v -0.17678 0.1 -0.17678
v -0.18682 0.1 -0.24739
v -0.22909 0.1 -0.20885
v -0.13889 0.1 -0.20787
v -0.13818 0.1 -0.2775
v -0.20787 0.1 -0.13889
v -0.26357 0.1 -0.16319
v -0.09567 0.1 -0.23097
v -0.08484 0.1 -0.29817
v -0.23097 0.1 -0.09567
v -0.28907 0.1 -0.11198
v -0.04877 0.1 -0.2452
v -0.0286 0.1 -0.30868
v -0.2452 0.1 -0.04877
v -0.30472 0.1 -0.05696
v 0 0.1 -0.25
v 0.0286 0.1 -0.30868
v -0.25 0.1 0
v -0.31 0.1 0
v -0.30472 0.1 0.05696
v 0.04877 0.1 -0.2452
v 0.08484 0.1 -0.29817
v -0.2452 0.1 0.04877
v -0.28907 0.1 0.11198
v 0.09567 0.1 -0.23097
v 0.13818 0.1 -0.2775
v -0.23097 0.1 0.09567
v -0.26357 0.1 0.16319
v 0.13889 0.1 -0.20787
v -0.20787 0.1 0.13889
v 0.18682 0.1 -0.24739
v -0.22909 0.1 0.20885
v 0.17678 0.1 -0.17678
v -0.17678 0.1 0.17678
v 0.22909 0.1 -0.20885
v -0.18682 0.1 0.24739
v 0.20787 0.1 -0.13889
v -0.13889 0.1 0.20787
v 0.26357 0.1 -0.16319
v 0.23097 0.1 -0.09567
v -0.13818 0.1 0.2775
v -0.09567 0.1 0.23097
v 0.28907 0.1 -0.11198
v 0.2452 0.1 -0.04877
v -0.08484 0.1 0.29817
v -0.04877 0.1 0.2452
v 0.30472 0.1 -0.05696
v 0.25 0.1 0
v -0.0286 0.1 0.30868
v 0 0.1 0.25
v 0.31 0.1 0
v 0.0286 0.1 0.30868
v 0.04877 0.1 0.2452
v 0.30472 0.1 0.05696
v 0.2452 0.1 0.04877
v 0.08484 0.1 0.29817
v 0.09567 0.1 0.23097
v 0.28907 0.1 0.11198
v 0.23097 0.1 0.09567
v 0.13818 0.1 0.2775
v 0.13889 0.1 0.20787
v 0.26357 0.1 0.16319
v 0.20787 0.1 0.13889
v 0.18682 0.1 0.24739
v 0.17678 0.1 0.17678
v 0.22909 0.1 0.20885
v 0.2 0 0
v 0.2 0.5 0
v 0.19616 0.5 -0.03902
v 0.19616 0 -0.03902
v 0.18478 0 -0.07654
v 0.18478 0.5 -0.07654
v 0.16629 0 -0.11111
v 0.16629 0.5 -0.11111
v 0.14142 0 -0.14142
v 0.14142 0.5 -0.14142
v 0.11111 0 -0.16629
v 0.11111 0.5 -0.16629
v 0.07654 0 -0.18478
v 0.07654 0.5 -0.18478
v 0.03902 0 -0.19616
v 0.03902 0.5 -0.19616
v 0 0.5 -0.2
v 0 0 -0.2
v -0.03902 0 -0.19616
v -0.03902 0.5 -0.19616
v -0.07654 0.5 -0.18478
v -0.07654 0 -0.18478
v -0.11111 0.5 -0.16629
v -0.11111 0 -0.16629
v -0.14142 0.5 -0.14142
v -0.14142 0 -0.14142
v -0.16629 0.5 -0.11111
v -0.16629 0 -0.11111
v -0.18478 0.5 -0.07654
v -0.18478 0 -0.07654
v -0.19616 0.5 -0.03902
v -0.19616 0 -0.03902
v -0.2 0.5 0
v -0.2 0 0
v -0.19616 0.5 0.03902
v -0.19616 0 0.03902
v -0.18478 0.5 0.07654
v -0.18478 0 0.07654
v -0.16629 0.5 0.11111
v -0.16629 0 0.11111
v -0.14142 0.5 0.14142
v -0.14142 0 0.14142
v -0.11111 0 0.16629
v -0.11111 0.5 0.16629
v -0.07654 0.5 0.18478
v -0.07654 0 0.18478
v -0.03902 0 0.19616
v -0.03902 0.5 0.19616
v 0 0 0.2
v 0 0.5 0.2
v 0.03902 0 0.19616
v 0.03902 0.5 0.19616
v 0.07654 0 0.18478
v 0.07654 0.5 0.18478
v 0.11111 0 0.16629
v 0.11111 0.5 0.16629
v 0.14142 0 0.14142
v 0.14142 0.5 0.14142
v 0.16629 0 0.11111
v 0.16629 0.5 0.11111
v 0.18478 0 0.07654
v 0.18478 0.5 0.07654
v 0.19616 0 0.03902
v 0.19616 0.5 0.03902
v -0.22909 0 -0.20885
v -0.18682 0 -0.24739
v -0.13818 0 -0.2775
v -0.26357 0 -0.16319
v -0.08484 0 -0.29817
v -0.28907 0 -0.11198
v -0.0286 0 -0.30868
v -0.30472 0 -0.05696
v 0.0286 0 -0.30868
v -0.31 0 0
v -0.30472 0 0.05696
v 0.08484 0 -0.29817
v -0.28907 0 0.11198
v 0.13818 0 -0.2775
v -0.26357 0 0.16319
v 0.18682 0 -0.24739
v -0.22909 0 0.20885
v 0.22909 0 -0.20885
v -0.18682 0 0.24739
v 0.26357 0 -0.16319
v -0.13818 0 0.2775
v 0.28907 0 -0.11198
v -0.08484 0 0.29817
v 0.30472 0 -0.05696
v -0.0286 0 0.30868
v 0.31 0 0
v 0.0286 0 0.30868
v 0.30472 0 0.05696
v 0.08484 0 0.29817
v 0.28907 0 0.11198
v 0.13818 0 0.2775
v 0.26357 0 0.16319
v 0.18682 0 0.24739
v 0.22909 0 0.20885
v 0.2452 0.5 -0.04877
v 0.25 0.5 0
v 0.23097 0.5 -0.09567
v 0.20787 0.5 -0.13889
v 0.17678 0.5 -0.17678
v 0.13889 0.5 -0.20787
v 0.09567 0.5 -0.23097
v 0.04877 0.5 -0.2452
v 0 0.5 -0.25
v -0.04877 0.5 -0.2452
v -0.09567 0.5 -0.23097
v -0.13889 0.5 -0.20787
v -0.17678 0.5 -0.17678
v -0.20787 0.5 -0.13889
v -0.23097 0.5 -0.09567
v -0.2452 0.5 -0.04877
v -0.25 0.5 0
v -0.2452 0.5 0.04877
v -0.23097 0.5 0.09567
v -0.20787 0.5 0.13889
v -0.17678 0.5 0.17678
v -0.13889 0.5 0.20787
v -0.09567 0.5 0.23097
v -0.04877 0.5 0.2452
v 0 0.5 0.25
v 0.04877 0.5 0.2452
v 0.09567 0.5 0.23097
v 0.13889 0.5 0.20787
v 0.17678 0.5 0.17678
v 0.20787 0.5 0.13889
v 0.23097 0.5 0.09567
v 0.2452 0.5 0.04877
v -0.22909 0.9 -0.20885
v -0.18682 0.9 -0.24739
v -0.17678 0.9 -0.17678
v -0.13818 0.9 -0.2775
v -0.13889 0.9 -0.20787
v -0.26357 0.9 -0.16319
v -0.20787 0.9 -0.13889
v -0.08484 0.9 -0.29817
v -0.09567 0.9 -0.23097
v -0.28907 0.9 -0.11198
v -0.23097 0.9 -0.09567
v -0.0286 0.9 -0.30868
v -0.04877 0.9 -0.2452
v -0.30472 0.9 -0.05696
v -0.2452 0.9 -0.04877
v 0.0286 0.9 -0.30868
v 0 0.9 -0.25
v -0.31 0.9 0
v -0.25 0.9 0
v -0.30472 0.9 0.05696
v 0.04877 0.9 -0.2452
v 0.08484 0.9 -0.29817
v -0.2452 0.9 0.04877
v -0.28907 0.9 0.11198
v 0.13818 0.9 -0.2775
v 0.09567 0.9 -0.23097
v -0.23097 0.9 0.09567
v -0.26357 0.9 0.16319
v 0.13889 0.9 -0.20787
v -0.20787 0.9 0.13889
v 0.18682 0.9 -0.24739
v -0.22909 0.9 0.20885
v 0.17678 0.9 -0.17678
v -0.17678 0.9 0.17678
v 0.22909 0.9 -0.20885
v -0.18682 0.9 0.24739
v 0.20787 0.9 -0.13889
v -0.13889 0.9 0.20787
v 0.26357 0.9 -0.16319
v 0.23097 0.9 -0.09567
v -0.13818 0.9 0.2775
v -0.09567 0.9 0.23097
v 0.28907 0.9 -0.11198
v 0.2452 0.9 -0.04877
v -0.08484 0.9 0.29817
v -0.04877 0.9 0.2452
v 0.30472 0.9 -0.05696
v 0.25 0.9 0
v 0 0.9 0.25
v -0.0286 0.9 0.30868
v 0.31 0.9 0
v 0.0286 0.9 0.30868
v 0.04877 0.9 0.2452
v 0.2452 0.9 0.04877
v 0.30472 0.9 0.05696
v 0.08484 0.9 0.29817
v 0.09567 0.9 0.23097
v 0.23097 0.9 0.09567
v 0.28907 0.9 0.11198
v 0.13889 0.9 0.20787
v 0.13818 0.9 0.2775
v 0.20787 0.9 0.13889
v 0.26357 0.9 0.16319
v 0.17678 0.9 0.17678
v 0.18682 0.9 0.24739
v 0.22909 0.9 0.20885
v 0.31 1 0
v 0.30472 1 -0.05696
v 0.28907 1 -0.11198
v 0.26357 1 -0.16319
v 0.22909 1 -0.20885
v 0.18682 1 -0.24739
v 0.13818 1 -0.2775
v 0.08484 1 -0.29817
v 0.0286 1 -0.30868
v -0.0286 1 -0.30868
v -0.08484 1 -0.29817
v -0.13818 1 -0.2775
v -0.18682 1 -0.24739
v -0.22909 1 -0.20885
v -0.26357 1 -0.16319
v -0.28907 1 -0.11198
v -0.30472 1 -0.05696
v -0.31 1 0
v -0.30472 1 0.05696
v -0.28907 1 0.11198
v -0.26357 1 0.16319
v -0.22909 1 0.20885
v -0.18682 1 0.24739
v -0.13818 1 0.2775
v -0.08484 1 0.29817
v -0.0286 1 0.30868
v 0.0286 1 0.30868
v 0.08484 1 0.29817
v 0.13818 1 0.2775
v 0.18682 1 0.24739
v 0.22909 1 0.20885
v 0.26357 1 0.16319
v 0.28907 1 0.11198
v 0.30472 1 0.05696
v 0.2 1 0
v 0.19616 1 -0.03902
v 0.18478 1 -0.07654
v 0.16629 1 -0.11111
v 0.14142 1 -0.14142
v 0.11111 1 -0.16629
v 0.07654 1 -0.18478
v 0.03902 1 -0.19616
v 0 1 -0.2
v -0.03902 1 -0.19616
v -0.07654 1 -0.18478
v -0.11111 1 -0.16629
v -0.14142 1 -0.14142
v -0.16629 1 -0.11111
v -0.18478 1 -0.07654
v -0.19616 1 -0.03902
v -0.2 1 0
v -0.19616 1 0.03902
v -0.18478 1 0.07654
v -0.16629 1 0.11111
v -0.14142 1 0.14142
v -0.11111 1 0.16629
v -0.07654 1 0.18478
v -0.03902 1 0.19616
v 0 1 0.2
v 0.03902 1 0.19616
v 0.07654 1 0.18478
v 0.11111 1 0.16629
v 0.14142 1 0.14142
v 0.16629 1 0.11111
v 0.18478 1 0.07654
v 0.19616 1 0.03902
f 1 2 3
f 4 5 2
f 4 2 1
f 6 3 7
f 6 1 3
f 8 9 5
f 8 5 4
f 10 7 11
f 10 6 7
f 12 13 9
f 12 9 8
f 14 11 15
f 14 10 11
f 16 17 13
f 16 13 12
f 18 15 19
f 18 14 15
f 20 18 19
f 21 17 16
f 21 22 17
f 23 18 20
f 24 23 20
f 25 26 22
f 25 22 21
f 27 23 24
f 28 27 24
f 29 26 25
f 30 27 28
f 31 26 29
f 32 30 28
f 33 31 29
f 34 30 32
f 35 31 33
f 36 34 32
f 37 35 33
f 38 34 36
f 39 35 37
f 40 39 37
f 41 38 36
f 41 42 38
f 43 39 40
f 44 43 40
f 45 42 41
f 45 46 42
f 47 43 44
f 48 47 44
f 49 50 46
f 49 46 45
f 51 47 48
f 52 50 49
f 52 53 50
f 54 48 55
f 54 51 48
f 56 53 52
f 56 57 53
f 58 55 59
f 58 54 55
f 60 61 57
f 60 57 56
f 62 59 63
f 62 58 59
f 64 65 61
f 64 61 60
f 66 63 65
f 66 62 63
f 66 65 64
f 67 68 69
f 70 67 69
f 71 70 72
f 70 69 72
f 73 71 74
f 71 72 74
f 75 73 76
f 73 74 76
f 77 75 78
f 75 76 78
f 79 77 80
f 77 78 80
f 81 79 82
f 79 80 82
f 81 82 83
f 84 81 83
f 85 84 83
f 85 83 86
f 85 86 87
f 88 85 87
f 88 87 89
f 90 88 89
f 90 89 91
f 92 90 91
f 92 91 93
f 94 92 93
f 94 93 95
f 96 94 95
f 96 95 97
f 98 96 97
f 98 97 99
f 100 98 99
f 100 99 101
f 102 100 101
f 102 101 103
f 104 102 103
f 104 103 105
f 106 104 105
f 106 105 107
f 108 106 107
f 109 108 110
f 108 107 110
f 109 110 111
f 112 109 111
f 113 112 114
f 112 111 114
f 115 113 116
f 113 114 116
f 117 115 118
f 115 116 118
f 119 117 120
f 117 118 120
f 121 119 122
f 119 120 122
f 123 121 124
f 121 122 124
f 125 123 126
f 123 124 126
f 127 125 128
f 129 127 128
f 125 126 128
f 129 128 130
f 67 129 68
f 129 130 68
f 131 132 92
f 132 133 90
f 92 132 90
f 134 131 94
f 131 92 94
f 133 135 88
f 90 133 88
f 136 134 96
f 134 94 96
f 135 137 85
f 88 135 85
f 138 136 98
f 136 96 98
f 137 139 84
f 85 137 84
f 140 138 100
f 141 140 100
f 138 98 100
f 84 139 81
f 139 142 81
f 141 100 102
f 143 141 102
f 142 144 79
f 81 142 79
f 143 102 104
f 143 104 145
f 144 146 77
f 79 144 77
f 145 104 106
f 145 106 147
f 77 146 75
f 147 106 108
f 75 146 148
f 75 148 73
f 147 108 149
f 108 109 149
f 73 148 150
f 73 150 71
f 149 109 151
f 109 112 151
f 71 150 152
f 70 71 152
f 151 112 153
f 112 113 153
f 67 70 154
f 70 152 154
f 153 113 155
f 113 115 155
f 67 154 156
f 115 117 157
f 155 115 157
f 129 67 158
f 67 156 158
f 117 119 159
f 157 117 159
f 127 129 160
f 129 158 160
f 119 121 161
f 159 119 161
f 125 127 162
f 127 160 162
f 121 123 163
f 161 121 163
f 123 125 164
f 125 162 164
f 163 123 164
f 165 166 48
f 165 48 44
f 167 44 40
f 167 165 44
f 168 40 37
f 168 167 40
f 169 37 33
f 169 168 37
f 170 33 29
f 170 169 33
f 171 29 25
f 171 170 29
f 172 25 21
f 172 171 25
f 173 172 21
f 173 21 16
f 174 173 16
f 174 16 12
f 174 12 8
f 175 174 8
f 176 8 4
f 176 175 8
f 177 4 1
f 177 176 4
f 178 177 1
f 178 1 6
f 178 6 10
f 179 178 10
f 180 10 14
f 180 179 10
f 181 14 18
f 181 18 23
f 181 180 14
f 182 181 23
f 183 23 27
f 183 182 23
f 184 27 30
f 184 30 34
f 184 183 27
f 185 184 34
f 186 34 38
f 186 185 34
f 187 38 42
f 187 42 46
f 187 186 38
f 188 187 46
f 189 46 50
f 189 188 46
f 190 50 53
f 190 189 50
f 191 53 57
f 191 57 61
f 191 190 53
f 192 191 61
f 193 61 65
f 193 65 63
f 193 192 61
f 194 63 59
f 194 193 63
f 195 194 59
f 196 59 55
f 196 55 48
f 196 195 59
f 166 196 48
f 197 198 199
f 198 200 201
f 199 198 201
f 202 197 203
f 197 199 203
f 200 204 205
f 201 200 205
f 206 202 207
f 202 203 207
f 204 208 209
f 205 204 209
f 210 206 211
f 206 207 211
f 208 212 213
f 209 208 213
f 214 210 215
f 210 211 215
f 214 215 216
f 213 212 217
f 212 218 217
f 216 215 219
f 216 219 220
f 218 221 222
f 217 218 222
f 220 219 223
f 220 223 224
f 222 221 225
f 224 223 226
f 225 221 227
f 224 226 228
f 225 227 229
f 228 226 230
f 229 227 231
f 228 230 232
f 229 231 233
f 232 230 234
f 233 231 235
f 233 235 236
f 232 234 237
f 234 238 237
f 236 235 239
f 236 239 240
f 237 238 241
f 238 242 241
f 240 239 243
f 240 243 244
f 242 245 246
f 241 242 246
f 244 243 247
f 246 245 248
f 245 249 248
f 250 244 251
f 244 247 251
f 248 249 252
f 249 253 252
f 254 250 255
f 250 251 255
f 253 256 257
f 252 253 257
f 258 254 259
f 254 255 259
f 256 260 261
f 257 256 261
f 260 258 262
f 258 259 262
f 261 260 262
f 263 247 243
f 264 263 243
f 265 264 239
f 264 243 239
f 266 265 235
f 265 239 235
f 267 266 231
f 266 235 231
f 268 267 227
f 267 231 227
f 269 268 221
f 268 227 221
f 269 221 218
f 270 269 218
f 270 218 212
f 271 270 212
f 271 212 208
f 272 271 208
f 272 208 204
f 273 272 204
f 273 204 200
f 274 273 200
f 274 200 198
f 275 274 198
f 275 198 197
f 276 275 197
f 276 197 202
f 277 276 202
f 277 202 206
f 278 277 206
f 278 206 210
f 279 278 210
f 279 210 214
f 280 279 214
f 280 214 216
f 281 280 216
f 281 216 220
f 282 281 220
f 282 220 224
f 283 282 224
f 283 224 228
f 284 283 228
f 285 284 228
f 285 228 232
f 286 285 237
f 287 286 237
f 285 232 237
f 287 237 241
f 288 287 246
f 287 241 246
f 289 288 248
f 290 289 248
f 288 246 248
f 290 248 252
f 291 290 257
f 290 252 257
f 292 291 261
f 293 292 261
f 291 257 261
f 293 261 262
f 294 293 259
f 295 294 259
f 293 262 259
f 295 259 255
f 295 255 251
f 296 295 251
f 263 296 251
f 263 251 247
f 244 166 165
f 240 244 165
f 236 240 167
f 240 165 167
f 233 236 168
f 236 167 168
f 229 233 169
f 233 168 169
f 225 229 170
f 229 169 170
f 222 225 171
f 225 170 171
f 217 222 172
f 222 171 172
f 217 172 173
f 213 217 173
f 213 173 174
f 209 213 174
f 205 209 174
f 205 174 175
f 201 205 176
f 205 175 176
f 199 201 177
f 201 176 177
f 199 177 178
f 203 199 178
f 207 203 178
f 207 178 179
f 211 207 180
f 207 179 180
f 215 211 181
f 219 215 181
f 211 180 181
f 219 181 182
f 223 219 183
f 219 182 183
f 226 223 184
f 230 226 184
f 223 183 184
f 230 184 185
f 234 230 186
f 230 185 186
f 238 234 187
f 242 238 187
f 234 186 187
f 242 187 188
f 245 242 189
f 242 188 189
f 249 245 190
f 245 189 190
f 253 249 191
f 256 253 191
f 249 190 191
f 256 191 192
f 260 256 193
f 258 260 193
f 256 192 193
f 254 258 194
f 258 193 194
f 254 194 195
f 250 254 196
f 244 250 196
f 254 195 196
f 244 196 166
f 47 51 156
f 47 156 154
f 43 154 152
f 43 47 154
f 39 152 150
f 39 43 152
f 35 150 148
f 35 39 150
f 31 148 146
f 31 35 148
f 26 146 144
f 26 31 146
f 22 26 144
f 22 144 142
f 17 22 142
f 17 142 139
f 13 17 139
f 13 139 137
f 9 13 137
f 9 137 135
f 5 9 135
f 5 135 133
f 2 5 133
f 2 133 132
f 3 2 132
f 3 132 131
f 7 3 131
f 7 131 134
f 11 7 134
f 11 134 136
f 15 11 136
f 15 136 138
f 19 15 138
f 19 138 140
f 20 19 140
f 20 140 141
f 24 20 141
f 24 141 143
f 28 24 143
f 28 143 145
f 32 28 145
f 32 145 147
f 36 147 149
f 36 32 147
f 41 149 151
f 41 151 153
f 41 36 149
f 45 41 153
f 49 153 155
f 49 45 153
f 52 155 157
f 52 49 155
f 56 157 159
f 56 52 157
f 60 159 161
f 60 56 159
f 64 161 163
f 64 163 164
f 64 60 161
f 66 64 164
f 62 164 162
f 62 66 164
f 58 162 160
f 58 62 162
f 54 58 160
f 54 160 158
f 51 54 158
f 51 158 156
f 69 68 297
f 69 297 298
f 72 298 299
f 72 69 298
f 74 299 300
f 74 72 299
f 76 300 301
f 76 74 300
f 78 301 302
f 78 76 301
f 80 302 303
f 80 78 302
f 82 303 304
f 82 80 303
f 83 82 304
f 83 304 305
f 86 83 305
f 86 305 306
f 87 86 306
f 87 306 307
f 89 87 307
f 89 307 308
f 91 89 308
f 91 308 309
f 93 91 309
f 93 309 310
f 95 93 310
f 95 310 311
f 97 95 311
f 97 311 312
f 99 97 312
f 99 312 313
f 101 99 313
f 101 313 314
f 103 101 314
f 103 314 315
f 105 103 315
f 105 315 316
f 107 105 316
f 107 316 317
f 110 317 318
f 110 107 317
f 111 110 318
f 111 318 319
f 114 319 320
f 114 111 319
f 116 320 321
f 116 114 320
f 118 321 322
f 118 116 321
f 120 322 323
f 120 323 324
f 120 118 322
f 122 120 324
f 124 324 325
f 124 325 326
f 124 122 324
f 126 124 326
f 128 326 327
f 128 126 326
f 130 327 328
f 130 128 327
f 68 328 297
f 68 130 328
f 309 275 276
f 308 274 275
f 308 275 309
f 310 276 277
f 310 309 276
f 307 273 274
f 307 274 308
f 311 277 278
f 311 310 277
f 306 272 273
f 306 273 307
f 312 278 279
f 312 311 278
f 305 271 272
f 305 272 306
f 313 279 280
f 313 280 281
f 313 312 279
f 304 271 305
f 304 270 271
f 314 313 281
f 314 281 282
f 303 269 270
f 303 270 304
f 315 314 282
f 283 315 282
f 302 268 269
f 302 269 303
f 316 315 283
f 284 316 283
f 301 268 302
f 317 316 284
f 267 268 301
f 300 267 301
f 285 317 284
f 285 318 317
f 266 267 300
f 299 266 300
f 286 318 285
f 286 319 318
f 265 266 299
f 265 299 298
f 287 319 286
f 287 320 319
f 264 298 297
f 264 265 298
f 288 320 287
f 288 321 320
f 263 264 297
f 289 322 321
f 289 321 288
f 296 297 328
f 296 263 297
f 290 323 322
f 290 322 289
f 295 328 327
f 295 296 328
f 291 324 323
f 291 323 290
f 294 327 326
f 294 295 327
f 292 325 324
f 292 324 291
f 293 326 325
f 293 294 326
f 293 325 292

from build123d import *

# Parameters (mm, degrees)
SKETCH3_R   = 0.25
SKETCH3_R_2 = 0.2
SKETCH6_R   = 0.31
SKETCH6_R_2 = 0.21


with BuildPart() as part:
    # Sweep-Thin1: sweep along a path in Sketch1
    with BuildLine(Plane.XY) as sweep_thin1_path:
        Line((0, 0), (0, 0.5))
    # Sketch3 → Sweep-Thin1 (sweep)
    with BuildSketch(Plane(origin=(0, 0, 0), x_dir=(1, 0, 0), z_dir=(0, 1, 0))):
        Circle(SKETCH3_R)
        Circle(SKETCH3_R_2, mode=Mode.SUBTRACT)
    sweep(path=sweep_thin1_path.line)

    # Sweep-Thin2: sweep along a path in Sketch5
    with BuildLine(Plane.XY) as sweep_thin2_path:
        Line((0, 0), (0, 0.1))
    # Sketch6 → Sweep-Thin2 (sweep)
    with BuildSketch(Plane(origin=(0, 0, 0), x_dir=(1, 0, 0), z_dir=(0, 1, 0))):
        Circle(SKETCH6_R)
        Circle(SKETCH6_R_2, mode=Mode.SUBTRACT)
    sweep(path=sweep_thin2_path.line)

    # Mirror2: part across plane


with BuildPart() as part_1:
    add(part.part)
    add(part.part.mirror(Plane.ZX.offset(0.5)))


solid = part_1.part
